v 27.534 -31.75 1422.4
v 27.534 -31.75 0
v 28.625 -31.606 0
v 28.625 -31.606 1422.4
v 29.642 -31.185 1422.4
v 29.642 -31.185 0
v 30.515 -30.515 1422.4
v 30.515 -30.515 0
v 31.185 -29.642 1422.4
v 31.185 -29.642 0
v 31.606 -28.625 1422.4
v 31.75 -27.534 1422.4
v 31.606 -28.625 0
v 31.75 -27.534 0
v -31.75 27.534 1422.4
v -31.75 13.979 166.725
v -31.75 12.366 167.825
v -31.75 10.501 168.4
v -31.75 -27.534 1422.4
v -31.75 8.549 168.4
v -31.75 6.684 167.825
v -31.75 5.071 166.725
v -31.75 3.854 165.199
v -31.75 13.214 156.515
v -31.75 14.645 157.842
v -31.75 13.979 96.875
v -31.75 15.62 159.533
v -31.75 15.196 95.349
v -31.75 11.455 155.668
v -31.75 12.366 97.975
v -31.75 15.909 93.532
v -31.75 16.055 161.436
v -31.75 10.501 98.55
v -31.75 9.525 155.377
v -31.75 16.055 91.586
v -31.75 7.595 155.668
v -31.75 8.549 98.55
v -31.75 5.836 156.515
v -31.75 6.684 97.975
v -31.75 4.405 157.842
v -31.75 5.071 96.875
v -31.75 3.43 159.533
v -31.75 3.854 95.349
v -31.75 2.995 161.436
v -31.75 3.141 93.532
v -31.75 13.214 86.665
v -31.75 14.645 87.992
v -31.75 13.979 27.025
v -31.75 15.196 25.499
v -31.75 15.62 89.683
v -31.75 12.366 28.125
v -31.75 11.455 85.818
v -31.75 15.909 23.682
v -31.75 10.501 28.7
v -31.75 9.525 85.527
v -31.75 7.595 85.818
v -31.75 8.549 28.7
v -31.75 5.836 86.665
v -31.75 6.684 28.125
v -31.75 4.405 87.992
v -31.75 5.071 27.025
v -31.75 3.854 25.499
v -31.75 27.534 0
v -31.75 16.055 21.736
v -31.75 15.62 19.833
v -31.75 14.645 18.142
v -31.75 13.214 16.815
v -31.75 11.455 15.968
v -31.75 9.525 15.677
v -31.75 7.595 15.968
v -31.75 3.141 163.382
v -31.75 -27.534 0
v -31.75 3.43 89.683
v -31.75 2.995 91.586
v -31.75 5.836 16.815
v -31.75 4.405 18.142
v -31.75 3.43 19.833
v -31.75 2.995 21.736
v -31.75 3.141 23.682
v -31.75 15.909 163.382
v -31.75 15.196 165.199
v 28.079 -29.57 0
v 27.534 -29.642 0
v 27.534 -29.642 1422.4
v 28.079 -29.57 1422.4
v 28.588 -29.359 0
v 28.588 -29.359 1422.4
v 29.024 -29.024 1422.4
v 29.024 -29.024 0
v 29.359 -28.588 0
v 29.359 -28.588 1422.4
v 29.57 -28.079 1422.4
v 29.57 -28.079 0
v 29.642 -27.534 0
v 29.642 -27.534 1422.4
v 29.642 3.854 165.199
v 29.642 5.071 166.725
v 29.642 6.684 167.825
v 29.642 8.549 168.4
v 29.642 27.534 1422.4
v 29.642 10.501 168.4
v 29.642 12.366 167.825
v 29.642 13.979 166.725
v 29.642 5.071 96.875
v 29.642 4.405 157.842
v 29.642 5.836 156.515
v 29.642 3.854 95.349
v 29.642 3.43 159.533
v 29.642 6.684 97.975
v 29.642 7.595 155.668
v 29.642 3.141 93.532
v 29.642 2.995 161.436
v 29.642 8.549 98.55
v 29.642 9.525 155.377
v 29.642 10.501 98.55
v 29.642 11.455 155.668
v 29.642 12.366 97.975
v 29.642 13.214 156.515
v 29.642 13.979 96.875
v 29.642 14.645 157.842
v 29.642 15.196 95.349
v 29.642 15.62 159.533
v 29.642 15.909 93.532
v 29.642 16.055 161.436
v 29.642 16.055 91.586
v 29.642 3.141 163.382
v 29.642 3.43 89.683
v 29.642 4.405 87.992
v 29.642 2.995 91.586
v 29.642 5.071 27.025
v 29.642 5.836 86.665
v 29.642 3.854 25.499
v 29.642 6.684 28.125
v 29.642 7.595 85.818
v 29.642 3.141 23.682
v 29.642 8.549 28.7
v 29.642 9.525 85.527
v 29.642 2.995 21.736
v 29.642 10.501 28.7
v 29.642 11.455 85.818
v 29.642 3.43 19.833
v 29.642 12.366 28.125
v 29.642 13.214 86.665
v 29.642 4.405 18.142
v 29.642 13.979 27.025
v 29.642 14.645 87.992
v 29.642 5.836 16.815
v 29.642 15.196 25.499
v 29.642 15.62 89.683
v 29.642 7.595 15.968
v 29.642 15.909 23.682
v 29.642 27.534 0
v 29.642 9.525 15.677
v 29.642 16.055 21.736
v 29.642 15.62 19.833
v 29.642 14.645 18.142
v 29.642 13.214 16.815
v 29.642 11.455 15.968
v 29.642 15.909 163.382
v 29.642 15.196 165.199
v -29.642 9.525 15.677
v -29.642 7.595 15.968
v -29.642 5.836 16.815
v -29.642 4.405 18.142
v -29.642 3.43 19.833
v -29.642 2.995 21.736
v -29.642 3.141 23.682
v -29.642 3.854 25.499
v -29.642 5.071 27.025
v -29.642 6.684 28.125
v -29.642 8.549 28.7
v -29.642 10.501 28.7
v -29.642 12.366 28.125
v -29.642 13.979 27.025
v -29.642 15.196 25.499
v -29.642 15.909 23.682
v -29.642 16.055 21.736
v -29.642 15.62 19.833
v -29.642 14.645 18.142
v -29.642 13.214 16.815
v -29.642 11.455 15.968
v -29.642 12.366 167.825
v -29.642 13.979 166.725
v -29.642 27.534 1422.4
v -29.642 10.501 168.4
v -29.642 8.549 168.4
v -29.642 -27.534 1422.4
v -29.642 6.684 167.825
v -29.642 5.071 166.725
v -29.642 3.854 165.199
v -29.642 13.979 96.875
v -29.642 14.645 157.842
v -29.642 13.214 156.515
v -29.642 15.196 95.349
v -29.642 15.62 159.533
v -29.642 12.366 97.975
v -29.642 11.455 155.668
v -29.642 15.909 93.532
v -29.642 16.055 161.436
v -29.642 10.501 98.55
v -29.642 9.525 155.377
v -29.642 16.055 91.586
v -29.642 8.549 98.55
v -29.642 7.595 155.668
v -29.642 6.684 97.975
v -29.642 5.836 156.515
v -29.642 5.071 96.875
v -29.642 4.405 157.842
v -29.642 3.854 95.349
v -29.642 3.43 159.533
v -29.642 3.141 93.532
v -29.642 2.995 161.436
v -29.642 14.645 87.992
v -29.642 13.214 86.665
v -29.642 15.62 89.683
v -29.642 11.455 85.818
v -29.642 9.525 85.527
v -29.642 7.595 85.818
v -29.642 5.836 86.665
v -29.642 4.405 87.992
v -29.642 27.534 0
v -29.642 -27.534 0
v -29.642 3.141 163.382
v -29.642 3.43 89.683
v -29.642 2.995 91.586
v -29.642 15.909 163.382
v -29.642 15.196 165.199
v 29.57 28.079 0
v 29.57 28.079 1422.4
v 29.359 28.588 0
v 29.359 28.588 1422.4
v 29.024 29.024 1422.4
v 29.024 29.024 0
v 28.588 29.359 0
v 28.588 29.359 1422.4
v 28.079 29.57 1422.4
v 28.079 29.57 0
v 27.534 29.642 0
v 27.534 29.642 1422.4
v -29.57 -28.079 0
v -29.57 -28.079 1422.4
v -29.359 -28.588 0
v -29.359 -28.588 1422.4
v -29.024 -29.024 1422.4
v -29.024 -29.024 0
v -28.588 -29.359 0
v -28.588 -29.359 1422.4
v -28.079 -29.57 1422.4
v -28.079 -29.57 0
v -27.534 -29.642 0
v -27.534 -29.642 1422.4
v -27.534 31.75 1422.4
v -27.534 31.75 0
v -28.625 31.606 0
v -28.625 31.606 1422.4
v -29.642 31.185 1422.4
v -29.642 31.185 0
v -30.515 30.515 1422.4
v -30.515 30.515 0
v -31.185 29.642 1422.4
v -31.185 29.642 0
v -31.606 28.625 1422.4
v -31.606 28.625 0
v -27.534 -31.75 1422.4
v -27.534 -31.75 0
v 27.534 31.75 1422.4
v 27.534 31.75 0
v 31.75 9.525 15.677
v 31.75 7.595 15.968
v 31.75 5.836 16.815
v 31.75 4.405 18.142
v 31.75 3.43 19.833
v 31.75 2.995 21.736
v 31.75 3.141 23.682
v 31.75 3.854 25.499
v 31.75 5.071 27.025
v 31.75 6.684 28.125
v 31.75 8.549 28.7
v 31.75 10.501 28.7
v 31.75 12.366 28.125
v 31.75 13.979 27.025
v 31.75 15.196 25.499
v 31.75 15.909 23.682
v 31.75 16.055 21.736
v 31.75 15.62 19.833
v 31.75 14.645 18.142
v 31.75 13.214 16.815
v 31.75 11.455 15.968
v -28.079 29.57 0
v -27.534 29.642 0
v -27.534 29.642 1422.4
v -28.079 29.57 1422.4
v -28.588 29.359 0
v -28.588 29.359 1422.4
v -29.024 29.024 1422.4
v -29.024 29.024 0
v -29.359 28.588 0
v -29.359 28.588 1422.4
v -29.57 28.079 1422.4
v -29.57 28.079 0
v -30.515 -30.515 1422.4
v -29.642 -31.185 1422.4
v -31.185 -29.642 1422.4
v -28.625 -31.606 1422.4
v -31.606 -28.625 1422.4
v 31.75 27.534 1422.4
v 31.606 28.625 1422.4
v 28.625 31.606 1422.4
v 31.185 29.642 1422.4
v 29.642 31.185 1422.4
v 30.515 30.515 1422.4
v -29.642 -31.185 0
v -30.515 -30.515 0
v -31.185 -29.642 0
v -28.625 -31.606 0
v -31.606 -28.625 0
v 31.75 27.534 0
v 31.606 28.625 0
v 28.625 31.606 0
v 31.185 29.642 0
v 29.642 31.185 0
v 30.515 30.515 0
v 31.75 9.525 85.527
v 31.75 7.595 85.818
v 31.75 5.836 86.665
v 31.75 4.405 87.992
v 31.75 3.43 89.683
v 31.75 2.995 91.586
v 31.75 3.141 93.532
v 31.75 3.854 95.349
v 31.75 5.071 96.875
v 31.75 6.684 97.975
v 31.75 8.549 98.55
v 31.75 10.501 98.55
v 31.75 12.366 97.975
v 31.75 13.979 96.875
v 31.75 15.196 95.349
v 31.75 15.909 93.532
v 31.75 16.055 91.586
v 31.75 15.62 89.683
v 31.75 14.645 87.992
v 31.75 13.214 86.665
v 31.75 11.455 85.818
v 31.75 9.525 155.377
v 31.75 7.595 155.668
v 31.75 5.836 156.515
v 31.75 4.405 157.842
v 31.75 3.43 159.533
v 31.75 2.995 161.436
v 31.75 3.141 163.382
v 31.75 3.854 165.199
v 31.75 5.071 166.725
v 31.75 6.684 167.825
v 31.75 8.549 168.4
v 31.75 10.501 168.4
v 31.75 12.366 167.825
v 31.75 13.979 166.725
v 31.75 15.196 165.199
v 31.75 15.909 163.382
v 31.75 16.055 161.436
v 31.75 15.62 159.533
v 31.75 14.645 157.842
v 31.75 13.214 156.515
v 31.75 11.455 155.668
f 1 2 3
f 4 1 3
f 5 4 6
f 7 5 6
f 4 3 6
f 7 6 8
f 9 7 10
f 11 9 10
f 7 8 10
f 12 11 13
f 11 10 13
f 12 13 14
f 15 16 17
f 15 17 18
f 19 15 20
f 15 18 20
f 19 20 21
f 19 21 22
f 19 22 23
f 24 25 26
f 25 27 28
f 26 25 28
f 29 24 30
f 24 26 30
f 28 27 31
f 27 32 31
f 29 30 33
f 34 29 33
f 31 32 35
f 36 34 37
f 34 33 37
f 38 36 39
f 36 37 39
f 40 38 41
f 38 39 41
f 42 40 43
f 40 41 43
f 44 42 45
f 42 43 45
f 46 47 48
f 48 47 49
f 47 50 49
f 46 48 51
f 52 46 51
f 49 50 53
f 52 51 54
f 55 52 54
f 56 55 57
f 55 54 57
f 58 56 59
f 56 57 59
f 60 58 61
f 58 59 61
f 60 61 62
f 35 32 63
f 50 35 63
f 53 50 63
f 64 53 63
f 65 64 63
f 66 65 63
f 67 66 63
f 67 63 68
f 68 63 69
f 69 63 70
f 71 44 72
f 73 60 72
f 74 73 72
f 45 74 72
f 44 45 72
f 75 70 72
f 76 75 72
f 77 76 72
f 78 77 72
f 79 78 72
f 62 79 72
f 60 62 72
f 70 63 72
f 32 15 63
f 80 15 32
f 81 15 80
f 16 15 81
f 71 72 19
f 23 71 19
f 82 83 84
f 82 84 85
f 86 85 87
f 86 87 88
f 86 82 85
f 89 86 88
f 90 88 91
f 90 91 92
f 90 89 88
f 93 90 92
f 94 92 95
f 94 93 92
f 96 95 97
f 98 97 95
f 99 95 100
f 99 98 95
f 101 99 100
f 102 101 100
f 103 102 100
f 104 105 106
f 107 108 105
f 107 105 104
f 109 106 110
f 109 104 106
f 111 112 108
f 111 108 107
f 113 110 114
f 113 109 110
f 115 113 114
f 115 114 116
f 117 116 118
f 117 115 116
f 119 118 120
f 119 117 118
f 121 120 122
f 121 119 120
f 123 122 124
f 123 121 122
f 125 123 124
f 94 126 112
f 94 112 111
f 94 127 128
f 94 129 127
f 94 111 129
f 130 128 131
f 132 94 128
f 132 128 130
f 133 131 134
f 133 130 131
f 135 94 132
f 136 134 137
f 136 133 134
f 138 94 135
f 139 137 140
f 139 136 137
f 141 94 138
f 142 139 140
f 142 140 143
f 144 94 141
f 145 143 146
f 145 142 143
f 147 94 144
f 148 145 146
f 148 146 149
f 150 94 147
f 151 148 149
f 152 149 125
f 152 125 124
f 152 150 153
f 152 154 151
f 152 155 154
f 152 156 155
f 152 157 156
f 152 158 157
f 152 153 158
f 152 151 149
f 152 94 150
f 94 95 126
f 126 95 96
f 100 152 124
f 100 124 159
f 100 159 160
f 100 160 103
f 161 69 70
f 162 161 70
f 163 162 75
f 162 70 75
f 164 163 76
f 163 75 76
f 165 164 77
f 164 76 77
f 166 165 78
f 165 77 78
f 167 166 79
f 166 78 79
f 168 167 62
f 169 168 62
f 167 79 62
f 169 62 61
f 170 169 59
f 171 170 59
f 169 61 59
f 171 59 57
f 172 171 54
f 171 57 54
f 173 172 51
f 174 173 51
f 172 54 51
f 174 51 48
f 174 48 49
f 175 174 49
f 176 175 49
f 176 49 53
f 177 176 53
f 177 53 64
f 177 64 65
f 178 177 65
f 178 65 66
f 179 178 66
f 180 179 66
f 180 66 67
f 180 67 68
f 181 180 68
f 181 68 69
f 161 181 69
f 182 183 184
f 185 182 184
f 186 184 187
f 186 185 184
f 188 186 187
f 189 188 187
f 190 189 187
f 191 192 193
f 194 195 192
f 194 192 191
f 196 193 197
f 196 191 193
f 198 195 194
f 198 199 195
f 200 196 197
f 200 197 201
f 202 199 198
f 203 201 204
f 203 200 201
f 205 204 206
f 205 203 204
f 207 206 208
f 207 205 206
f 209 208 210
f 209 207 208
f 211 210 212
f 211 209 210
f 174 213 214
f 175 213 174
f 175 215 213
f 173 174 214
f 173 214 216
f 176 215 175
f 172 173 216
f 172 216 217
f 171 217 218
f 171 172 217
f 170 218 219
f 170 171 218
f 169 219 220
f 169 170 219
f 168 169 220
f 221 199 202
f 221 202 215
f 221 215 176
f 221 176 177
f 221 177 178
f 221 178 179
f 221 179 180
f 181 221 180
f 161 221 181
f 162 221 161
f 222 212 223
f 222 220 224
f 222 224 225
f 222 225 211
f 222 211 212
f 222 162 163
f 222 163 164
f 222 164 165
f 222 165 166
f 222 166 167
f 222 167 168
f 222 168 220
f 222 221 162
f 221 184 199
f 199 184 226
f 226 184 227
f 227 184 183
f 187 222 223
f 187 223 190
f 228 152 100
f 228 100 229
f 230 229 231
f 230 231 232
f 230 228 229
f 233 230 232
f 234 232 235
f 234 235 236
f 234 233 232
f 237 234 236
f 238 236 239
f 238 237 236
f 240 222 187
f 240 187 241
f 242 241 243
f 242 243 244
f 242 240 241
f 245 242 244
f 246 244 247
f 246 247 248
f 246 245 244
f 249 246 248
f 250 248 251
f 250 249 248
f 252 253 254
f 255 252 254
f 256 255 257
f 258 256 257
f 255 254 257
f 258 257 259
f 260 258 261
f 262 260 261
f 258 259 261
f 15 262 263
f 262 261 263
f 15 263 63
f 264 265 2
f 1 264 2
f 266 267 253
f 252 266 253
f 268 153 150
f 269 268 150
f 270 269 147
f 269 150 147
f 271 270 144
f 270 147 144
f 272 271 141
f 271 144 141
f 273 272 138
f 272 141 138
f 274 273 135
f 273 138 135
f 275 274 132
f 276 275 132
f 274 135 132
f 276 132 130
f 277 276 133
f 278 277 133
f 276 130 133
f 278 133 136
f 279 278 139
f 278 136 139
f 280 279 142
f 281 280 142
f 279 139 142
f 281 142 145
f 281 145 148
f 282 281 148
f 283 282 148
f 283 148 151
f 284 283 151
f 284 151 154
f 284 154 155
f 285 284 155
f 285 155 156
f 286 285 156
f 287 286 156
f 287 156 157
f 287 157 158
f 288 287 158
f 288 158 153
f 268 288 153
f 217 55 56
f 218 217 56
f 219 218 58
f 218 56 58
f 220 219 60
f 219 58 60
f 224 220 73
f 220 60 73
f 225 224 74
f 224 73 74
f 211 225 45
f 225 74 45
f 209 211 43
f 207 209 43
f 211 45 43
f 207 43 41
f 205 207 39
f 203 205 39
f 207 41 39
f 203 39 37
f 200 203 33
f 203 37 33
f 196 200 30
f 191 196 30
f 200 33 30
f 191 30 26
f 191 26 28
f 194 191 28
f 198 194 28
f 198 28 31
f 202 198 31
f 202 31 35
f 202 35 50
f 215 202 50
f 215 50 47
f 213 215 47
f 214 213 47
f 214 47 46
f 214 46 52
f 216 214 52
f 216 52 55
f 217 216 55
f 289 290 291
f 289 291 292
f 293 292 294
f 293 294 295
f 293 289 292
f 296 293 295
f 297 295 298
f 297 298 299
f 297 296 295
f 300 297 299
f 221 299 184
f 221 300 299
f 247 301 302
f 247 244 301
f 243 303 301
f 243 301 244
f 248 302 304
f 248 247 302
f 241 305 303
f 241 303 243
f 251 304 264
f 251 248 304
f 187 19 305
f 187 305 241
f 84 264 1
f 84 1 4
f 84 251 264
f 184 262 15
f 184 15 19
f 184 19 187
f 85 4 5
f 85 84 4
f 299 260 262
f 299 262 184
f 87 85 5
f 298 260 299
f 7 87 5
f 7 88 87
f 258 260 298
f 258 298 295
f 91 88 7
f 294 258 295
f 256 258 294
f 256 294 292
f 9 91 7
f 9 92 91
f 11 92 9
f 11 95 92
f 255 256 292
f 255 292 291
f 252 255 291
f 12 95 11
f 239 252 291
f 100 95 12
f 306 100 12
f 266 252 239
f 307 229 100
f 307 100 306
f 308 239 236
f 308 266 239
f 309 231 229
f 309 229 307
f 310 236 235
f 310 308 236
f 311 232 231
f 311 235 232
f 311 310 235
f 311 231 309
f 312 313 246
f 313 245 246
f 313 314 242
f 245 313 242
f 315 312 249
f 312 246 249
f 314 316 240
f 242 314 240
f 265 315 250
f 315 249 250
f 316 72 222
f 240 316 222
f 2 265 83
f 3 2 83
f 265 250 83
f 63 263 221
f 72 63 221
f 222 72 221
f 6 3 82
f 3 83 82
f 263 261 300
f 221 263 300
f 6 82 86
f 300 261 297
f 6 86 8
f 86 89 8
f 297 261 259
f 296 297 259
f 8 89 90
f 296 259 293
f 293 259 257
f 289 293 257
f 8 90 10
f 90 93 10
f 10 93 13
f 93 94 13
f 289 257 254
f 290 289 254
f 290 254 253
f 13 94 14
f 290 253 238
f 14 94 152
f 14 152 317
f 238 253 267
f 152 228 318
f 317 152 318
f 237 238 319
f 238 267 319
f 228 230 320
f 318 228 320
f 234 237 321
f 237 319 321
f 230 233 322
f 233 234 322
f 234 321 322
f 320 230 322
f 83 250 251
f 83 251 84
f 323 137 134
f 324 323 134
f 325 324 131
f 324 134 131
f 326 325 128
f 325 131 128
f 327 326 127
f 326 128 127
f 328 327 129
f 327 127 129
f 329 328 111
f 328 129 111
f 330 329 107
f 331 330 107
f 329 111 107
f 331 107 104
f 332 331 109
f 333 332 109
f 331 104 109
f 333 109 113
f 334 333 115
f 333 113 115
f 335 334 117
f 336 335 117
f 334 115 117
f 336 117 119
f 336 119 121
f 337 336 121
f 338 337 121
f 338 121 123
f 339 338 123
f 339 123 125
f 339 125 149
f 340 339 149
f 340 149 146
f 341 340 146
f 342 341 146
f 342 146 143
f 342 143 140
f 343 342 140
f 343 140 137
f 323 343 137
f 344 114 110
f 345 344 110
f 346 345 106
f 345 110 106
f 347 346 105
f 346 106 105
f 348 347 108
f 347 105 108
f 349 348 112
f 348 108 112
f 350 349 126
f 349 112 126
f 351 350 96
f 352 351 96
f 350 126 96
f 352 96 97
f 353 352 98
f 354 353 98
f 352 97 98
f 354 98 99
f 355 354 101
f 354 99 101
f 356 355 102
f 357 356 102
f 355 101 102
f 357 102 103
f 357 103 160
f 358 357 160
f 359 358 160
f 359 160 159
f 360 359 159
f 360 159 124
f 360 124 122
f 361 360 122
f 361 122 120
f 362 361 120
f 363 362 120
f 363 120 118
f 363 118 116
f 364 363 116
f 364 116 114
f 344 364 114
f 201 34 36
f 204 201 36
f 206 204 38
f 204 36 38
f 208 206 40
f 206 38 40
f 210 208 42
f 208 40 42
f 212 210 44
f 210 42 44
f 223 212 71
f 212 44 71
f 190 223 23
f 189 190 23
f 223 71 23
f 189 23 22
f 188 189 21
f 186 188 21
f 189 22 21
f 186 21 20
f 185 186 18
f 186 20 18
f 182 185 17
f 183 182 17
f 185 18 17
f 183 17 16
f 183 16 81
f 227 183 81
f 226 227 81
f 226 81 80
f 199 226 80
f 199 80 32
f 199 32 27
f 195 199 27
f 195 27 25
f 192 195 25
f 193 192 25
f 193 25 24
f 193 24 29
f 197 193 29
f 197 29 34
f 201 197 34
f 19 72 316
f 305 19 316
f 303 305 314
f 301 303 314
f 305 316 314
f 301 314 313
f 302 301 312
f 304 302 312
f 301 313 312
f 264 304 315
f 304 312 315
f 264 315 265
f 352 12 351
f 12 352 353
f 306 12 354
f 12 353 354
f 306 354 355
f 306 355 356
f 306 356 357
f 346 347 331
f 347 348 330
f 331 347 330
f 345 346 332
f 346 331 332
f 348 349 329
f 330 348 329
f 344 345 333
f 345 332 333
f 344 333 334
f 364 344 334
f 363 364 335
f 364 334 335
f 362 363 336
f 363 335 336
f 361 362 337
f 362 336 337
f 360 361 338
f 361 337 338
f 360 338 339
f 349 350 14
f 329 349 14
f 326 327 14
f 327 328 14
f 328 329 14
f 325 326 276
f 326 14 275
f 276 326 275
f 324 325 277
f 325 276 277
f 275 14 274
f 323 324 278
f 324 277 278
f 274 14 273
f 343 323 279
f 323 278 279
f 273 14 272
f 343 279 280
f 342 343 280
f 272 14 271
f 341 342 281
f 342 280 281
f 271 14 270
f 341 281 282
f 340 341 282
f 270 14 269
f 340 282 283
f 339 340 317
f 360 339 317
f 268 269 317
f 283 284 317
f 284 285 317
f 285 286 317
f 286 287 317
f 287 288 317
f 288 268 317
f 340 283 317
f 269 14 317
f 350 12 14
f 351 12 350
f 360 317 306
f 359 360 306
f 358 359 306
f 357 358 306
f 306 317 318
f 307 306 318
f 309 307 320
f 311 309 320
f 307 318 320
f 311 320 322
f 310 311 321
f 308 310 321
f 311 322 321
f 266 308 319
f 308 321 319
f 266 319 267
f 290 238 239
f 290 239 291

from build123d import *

# Parameters (mm, degrees)
BOSS_EXTRUDE1_DEPTH     = 1422.4
F_1_2_CLEARANCE_HOLE1_D = 13.09624


with BuildPart() as part:
    # Sketch1 → Boss-Extrude1 (new body)
    with BuildSketch(Plane.XY):
        with BuildLine():
            Line((27.5336, 31.75), (-27.5336, 31.75))
            ThreePointArc((-27.5336, 31.75), (-30.515045032, 30.515045032), (-31.75, 27.5336))
            Line((-31.75, 27.5336), (-31.75, -27.5336))
            ThreePointArc((-31.75, -27.5336), (-30.515045032, -30.515045032), (-27.5336, -31.75))
            Line((-27.5336, -31.75), (27.5336, -31.75))
            ThreePointArc((27.5336, -31.75), (30.515045032, -30.515045032), (31.75, -27.5336))
            Line((31.75, -27.5336), (31.75, 27.5336))
            ThreePointArc((31.75, 27.5336), (30.515045032, 30.515045032), (27.5336, 31.75))
        make_face()
        with BuildLine():
            Line((27.5336, 29.6418), (-27.5336, 29.6418))
            ThreePointArc((-27.5336, 29.6418), (-29.024322516, 29.024322516), (-29.6418, 27.5336))
            Line((-29.6418, 27.5336), (-29.6418, -27.5336))
            ThreePointArc((-29.6418, -27.5336), (-29.024322516, -29.024322516), (-27.5336, -29.6418))
            Line((-27.5336, -29.6418), (27.5336, -29.6418))
            ThreePointArc((27.5336, -29.6418), (29.024322516, -29.024322516), (29.6418, -27.5336))
            Line((29.6418, -27.5336), (29.6418, 27.5336))
            ThreePointArc((29.6418, 27.5336), (29.024322516, 29.024322516), (27.5336, 29.6418))
        make_face(mode=Mode.SUBTRACT)
    extrude(amount=BOSS_EXTRUDE1_DEPTH)

    # 1/2 Clearance Hole1 (through all)
    with Locations(Plane(origin=(31.75, 9.525, 22.225), x_dir=(0, 0, 1), z_dir=(1, 0, 0))):
        with Locations((0, 0), (69.85, 0), (139.7, 0)):
            Hole(F_1_2_CLEARANCE_HOLE1_D / 2)


solid = part.part
